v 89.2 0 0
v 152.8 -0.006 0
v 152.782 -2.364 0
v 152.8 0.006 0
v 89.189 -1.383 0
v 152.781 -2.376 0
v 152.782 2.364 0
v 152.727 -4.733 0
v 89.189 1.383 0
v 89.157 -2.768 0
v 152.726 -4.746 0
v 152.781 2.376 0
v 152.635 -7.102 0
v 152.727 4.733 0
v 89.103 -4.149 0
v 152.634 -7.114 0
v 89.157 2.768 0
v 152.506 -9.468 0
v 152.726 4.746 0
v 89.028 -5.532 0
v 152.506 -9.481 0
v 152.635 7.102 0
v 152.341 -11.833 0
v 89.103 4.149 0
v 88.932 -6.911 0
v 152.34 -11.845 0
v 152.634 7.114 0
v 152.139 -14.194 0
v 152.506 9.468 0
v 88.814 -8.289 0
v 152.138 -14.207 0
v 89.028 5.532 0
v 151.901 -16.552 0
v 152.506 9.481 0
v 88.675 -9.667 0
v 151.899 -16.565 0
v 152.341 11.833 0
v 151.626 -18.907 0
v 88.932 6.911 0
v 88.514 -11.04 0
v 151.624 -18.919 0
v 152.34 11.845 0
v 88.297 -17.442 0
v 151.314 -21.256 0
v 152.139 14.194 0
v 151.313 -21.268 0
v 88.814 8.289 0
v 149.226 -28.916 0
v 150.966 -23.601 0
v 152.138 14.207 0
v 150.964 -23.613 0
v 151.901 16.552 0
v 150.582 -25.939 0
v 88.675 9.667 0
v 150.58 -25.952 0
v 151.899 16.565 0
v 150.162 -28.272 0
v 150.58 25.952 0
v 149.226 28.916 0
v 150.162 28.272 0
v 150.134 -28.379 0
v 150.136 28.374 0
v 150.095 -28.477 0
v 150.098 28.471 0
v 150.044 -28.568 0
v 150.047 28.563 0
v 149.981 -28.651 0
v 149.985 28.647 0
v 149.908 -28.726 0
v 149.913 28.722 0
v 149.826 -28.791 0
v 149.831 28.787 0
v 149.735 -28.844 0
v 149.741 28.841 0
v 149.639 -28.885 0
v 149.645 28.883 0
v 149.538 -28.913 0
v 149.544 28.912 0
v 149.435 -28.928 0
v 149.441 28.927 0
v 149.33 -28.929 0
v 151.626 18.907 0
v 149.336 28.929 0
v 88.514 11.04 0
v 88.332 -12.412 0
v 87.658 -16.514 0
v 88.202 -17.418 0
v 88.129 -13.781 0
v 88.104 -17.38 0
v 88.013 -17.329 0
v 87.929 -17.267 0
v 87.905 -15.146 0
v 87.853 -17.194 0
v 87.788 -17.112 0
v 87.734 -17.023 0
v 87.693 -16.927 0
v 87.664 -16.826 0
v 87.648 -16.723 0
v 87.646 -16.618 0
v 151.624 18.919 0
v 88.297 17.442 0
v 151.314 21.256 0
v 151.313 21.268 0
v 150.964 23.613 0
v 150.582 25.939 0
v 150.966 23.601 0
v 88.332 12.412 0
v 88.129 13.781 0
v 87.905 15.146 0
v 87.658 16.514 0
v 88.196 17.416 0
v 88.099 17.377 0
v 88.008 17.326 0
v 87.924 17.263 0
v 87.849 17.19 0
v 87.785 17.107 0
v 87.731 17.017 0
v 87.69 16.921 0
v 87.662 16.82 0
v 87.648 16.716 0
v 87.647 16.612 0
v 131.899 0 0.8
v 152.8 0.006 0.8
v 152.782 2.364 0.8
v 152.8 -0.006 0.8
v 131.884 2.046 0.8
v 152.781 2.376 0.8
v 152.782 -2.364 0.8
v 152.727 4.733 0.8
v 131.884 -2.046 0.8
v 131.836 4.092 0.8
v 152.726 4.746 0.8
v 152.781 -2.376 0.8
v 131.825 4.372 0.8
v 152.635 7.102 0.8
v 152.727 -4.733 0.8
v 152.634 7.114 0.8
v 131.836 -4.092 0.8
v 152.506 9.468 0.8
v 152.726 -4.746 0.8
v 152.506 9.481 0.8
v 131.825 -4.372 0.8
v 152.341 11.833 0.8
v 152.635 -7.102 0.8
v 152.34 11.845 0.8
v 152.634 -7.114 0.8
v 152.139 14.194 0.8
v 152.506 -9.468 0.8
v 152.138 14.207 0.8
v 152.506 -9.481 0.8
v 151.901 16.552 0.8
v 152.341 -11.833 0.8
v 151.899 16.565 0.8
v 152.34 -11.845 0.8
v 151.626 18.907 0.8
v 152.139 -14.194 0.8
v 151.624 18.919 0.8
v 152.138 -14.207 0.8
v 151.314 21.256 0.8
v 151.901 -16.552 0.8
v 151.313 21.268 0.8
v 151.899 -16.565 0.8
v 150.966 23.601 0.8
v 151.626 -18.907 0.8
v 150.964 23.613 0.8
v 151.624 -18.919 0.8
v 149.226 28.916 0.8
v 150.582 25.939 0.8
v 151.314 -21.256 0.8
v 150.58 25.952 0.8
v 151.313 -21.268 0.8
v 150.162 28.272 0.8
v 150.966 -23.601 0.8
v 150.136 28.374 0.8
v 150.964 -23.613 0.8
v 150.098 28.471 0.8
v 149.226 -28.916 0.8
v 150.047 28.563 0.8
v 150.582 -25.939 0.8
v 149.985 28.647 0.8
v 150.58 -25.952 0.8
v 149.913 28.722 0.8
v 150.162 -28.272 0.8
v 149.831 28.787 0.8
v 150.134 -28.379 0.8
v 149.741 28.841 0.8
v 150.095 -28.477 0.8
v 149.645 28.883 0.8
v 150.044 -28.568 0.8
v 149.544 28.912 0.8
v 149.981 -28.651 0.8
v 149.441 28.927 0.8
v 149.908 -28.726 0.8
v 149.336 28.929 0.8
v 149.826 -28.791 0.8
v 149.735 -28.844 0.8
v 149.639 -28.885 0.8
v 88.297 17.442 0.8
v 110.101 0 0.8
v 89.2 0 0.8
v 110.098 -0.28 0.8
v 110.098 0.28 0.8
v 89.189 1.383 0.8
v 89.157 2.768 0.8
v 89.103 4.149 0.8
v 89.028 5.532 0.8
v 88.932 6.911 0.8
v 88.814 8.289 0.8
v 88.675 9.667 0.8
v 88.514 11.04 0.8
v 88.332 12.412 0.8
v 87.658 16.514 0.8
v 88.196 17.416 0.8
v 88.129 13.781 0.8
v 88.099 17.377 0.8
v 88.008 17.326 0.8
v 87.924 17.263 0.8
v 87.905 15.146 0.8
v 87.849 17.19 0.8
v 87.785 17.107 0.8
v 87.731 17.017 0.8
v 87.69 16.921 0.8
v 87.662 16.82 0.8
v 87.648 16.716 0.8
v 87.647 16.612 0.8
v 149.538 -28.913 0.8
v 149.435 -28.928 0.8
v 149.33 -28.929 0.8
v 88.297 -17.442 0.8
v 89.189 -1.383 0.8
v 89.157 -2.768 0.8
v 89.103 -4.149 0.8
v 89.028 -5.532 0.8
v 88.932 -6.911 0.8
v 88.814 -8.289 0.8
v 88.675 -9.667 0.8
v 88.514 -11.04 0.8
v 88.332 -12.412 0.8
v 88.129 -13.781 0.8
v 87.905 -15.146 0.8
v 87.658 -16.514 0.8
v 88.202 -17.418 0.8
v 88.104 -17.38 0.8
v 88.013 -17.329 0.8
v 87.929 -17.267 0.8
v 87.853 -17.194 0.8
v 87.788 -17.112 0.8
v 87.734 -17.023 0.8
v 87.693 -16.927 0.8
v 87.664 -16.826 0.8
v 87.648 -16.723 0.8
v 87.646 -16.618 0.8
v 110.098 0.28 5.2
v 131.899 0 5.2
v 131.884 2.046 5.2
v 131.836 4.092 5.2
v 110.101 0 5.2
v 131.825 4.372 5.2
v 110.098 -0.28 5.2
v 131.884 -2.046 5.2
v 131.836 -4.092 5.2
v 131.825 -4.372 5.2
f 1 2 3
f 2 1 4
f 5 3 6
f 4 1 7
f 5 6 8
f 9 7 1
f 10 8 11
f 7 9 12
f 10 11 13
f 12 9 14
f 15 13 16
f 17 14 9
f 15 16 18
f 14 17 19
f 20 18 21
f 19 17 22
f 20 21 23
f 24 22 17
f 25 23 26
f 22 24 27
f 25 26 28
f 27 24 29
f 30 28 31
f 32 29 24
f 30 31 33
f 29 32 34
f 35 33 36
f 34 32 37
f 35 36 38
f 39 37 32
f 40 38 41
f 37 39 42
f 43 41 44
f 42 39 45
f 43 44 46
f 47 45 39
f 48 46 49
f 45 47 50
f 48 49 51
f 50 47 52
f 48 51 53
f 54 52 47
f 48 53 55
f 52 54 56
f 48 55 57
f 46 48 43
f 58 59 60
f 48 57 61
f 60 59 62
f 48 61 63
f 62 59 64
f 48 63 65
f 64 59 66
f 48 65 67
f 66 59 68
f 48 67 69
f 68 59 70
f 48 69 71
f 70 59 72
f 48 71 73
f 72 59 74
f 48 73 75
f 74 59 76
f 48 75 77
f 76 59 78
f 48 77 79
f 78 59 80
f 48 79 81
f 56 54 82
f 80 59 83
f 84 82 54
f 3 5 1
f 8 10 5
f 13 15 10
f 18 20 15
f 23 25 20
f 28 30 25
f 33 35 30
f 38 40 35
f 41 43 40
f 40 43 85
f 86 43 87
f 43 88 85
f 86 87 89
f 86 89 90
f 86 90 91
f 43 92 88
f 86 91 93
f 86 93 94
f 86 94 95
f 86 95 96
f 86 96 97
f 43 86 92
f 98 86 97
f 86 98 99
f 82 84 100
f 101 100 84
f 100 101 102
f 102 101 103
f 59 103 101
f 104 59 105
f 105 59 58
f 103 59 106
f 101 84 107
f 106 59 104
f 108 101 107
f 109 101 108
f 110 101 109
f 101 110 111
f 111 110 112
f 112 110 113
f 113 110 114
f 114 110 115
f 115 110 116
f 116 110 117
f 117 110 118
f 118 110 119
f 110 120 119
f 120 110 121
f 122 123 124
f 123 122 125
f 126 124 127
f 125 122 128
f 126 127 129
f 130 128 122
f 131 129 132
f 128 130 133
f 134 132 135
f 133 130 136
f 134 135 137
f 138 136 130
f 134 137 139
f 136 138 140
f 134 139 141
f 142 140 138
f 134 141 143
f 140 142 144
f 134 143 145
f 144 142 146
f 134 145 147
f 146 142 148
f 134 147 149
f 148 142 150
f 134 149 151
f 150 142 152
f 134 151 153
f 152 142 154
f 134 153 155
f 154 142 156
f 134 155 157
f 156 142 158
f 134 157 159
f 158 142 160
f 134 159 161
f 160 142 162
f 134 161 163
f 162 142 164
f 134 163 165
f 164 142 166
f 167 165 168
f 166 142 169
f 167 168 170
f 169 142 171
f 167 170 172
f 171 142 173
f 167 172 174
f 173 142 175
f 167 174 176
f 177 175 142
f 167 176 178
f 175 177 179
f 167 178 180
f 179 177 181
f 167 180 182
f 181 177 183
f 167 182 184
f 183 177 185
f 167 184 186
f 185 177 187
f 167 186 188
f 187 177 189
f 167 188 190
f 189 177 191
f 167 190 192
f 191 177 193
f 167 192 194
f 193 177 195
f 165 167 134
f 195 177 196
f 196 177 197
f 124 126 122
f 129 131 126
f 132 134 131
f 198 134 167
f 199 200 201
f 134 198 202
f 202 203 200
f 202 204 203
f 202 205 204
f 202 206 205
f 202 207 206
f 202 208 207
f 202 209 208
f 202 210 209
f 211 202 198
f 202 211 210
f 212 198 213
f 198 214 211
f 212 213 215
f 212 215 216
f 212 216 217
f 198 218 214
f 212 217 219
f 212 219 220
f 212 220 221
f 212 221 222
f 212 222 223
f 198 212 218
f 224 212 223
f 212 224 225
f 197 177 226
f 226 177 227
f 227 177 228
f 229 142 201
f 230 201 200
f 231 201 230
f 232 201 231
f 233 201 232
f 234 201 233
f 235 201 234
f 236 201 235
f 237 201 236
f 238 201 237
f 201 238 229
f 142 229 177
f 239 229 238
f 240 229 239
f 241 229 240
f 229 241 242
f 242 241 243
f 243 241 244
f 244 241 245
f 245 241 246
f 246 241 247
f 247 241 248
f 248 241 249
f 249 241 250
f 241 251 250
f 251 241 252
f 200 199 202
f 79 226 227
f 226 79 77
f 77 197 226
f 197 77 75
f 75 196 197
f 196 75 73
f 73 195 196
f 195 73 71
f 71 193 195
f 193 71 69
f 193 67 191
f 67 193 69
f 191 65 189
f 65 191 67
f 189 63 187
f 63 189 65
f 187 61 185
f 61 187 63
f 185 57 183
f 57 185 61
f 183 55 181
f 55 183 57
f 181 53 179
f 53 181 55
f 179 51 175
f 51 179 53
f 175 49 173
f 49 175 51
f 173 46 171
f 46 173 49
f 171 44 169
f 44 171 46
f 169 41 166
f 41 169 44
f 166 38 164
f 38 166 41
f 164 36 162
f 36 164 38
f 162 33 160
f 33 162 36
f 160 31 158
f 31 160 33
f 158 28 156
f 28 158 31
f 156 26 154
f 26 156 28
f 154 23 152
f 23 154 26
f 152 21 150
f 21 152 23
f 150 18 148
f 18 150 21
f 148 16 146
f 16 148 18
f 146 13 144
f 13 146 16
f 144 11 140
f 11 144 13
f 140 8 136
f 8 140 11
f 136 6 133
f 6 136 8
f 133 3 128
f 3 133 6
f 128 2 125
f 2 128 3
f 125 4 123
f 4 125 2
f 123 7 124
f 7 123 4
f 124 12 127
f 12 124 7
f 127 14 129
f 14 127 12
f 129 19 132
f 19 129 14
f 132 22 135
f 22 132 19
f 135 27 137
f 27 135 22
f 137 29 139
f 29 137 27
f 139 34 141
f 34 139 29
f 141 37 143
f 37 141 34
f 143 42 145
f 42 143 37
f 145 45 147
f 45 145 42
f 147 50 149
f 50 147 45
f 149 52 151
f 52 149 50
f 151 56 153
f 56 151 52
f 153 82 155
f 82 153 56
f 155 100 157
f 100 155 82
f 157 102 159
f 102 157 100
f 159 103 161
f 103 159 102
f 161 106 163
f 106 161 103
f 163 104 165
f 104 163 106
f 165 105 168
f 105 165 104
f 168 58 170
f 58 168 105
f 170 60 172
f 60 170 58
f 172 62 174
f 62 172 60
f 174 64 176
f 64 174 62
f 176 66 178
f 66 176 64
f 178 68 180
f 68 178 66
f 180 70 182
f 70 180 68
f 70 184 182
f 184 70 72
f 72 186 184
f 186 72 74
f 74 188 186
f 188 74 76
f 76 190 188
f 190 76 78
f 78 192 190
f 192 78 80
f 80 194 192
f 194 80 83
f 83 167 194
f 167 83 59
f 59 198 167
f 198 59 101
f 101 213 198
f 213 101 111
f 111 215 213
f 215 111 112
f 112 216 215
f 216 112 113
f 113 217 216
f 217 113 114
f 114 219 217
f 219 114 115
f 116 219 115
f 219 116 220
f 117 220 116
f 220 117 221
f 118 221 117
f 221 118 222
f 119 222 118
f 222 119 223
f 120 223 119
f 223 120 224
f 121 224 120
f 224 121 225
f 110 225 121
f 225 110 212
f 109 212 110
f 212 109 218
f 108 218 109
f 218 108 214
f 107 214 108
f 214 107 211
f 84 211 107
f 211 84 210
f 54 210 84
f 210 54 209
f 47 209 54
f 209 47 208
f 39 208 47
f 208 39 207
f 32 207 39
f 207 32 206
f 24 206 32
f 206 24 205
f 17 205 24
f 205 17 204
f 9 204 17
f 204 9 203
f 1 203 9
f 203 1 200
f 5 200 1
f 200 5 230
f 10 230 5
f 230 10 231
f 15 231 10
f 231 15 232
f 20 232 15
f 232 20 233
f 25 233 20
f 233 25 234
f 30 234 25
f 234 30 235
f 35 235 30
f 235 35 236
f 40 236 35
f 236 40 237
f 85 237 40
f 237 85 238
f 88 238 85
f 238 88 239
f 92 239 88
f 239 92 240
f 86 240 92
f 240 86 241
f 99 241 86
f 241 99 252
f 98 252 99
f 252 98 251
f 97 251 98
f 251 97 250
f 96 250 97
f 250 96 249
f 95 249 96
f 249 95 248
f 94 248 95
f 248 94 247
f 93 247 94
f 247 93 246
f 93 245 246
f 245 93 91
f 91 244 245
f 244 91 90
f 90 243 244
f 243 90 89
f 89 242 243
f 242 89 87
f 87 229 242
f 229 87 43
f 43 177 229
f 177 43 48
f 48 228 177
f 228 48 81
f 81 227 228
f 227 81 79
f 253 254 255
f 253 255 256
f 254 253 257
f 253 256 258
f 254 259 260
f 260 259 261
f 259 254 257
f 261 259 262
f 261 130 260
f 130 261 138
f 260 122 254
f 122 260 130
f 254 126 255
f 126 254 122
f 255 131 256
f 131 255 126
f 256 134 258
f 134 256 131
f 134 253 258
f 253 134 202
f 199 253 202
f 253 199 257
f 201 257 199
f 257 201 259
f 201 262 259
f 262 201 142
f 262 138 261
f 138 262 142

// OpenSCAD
// Gen-DP — bobbin BASE (bottom flange + hub). Print x12, flange down. Wind 24 AWG x 241 t around
// the hub with the LID glued on (coil_lid.stl). Copper lives ONLY between the flanges (no proud winds).
include <parameters.scad>;
$fn = 48;
module sector_2d(r_in, r_out, ang) {
    polygon([
        for (a = [-ang/2 : ang/24 : ang/2]) [r_in*cos(a), r_in*sin(a)],
        for (a = [ang/2 : -ang/24 : -ang/2]) [r_out*cos(a), r_out*sin(a)]
    ]);
}
module footprint_2d() { offset(r=wall) sector_2d(coil_id_r, coil_od_r, span_deg); }
module hub_2d()       { offset(delta=-coil_core_inset) sector_2d(coil_id_r, coil_od_r, span_deg); }

union() {
    linear_extrude(flange_t) footprint_2d();
    translate([0, 0, flange_t - 0.01]) linear_extrude(former_web + 0.01) hub_2d();
}
